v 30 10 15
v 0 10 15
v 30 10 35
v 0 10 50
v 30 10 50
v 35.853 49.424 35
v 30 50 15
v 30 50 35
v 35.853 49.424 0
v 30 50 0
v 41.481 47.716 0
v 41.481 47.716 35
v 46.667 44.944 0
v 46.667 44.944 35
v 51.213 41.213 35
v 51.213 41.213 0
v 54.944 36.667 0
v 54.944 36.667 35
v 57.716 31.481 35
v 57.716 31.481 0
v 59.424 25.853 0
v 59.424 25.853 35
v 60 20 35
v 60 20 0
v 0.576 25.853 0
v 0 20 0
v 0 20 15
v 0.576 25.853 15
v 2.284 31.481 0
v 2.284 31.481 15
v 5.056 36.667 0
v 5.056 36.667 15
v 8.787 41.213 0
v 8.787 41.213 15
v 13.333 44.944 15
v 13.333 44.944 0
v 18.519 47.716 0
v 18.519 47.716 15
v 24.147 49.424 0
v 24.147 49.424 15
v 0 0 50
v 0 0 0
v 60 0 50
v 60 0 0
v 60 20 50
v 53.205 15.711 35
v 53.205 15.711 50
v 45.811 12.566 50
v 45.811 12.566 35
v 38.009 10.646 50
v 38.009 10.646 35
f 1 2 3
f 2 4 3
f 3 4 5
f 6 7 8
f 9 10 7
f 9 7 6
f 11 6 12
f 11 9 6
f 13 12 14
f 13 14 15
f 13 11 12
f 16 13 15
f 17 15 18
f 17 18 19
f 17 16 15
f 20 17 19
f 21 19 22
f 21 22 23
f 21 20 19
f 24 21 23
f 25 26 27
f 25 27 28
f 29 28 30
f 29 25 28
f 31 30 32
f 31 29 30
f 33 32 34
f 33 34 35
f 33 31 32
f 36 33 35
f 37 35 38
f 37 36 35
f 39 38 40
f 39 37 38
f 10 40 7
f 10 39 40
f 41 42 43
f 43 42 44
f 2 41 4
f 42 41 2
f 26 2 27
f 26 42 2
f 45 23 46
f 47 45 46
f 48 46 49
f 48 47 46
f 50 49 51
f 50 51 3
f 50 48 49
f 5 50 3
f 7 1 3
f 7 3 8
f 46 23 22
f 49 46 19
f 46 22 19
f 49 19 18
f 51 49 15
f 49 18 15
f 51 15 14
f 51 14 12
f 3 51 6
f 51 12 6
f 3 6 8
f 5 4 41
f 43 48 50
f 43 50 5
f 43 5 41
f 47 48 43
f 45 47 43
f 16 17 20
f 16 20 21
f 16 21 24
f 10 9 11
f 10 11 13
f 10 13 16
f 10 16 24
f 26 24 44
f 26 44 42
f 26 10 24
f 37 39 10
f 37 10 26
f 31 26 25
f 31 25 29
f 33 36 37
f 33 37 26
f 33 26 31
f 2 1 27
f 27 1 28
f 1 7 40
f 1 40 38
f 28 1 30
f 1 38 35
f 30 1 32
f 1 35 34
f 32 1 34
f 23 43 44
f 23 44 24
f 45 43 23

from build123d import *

# Parameters (mm, degrees)
SKETCH2_W            = 60
SKETCH2_H            = 10
BOSS_EXTRUDE10_DEPTH = 50
BOSS_EXTRUDE11_DEPTH = 15
BOSS_EXTRUDE12_DEPTH = 35
BOSS_EXTRUDE14_DEPTH = 50
BOSS_EXTRUDE18_DEPTH = 35
SKETCH14_W           = 30
SKETCH14_H           = 10
CUT_EXTRUDE1_DEPTH   = 20


with BuildPart() as part:
    # Sketch2 → Boss-Extrude10 (new body)
    with BuildSketch(Plane.XY):
        with Locations((30, 5)):
            Rectangle(SKETCH2_W, SKETCH2_H)
    extrude(amount=BOSS_EXTRUDE10_DEPTH)

    # Sketch12 → Boss-Extrude14 (add)
    with BuildSketch(Plane.XY.offset(50)):
        with BuildLine():
            Line((30, 10), (60, 10))
            Line((60, 10), (60, 20))
            ThreePointArc((60, 20), (45.811388301, 12.565835097), (30, 10))
        make_face()
    extrude(amount=-BOSS_EXTRUDE14_DEPTH)



with BuildPart() as body_2:
    # Sketch9 → Boss-Extrude11 (new body)
    with BuildSketch(Plane(origin=(0, 0, 0), x_dir=(-1, 0, 0), z_dir=(0, 0, -1))):
        with BuildLine():
            Line((-30, 50), (-30, 20))
            Line((-30, 20), (0, 20))
            ThreePointArc((0, 20), (-8.786796564, 41.213203436), (-30, 50))
        make_face()
    extrude(amount=-BOSS_EXTRUDE11_DEPTH)

    # Sketch10 → Boss-Extrude12 (add)
    with BuildSketch(Plane(origin=(0, 0, 0), x_dir=(-1, 0, 0), z_dir=(0, 0, -1))):
        with BuildLine():
            Line((-60, 20), (-30, 20))
            Line((-30, 20), (-30, 50))
            ThreePointArc((-30, 50), (-51.213203436, 41.213203436), (-60, 20))
        make_face()
    extrude(amount=-BOSS_EXTRUDE12_DEPTH)


with BuildPart() as part_1:
    add(part.part)

    add(body_2.part)  # Boss-Extrude18 merges body 2
    # Sketch13 → Boss-Extrude18 (add)
    with BuildSketch(Plane(origin=(0, 0, 0), x_dir=(-1, 0, 0), z_dir=(0, 0, -1))):
        with BuildLine():
            Line((0, 20), (-60, 20))
            ThreePointArc((-60, 20), (-45.811388301, 12.565835097), (-30, 10))
            Line((-30, 10), (0, 10))
            Line((0, 10), (0, 20))
        make_face()
    extrude(amount=-BOSS_EXTRUDE18_DEPTH)

    # Sketch14 → Cut-Extrude1 (cut)
    with BuildSketch(Plane.XY.offset(35)):
        with Locations((15, 15)):
            Rectangle(SKETCH14_W, SKETCH14_H)
    extrude(amount=-CUT_EXTRUDE1_DEPTH, mode=Mode.SUBTRACT)


solid = part_1.part
